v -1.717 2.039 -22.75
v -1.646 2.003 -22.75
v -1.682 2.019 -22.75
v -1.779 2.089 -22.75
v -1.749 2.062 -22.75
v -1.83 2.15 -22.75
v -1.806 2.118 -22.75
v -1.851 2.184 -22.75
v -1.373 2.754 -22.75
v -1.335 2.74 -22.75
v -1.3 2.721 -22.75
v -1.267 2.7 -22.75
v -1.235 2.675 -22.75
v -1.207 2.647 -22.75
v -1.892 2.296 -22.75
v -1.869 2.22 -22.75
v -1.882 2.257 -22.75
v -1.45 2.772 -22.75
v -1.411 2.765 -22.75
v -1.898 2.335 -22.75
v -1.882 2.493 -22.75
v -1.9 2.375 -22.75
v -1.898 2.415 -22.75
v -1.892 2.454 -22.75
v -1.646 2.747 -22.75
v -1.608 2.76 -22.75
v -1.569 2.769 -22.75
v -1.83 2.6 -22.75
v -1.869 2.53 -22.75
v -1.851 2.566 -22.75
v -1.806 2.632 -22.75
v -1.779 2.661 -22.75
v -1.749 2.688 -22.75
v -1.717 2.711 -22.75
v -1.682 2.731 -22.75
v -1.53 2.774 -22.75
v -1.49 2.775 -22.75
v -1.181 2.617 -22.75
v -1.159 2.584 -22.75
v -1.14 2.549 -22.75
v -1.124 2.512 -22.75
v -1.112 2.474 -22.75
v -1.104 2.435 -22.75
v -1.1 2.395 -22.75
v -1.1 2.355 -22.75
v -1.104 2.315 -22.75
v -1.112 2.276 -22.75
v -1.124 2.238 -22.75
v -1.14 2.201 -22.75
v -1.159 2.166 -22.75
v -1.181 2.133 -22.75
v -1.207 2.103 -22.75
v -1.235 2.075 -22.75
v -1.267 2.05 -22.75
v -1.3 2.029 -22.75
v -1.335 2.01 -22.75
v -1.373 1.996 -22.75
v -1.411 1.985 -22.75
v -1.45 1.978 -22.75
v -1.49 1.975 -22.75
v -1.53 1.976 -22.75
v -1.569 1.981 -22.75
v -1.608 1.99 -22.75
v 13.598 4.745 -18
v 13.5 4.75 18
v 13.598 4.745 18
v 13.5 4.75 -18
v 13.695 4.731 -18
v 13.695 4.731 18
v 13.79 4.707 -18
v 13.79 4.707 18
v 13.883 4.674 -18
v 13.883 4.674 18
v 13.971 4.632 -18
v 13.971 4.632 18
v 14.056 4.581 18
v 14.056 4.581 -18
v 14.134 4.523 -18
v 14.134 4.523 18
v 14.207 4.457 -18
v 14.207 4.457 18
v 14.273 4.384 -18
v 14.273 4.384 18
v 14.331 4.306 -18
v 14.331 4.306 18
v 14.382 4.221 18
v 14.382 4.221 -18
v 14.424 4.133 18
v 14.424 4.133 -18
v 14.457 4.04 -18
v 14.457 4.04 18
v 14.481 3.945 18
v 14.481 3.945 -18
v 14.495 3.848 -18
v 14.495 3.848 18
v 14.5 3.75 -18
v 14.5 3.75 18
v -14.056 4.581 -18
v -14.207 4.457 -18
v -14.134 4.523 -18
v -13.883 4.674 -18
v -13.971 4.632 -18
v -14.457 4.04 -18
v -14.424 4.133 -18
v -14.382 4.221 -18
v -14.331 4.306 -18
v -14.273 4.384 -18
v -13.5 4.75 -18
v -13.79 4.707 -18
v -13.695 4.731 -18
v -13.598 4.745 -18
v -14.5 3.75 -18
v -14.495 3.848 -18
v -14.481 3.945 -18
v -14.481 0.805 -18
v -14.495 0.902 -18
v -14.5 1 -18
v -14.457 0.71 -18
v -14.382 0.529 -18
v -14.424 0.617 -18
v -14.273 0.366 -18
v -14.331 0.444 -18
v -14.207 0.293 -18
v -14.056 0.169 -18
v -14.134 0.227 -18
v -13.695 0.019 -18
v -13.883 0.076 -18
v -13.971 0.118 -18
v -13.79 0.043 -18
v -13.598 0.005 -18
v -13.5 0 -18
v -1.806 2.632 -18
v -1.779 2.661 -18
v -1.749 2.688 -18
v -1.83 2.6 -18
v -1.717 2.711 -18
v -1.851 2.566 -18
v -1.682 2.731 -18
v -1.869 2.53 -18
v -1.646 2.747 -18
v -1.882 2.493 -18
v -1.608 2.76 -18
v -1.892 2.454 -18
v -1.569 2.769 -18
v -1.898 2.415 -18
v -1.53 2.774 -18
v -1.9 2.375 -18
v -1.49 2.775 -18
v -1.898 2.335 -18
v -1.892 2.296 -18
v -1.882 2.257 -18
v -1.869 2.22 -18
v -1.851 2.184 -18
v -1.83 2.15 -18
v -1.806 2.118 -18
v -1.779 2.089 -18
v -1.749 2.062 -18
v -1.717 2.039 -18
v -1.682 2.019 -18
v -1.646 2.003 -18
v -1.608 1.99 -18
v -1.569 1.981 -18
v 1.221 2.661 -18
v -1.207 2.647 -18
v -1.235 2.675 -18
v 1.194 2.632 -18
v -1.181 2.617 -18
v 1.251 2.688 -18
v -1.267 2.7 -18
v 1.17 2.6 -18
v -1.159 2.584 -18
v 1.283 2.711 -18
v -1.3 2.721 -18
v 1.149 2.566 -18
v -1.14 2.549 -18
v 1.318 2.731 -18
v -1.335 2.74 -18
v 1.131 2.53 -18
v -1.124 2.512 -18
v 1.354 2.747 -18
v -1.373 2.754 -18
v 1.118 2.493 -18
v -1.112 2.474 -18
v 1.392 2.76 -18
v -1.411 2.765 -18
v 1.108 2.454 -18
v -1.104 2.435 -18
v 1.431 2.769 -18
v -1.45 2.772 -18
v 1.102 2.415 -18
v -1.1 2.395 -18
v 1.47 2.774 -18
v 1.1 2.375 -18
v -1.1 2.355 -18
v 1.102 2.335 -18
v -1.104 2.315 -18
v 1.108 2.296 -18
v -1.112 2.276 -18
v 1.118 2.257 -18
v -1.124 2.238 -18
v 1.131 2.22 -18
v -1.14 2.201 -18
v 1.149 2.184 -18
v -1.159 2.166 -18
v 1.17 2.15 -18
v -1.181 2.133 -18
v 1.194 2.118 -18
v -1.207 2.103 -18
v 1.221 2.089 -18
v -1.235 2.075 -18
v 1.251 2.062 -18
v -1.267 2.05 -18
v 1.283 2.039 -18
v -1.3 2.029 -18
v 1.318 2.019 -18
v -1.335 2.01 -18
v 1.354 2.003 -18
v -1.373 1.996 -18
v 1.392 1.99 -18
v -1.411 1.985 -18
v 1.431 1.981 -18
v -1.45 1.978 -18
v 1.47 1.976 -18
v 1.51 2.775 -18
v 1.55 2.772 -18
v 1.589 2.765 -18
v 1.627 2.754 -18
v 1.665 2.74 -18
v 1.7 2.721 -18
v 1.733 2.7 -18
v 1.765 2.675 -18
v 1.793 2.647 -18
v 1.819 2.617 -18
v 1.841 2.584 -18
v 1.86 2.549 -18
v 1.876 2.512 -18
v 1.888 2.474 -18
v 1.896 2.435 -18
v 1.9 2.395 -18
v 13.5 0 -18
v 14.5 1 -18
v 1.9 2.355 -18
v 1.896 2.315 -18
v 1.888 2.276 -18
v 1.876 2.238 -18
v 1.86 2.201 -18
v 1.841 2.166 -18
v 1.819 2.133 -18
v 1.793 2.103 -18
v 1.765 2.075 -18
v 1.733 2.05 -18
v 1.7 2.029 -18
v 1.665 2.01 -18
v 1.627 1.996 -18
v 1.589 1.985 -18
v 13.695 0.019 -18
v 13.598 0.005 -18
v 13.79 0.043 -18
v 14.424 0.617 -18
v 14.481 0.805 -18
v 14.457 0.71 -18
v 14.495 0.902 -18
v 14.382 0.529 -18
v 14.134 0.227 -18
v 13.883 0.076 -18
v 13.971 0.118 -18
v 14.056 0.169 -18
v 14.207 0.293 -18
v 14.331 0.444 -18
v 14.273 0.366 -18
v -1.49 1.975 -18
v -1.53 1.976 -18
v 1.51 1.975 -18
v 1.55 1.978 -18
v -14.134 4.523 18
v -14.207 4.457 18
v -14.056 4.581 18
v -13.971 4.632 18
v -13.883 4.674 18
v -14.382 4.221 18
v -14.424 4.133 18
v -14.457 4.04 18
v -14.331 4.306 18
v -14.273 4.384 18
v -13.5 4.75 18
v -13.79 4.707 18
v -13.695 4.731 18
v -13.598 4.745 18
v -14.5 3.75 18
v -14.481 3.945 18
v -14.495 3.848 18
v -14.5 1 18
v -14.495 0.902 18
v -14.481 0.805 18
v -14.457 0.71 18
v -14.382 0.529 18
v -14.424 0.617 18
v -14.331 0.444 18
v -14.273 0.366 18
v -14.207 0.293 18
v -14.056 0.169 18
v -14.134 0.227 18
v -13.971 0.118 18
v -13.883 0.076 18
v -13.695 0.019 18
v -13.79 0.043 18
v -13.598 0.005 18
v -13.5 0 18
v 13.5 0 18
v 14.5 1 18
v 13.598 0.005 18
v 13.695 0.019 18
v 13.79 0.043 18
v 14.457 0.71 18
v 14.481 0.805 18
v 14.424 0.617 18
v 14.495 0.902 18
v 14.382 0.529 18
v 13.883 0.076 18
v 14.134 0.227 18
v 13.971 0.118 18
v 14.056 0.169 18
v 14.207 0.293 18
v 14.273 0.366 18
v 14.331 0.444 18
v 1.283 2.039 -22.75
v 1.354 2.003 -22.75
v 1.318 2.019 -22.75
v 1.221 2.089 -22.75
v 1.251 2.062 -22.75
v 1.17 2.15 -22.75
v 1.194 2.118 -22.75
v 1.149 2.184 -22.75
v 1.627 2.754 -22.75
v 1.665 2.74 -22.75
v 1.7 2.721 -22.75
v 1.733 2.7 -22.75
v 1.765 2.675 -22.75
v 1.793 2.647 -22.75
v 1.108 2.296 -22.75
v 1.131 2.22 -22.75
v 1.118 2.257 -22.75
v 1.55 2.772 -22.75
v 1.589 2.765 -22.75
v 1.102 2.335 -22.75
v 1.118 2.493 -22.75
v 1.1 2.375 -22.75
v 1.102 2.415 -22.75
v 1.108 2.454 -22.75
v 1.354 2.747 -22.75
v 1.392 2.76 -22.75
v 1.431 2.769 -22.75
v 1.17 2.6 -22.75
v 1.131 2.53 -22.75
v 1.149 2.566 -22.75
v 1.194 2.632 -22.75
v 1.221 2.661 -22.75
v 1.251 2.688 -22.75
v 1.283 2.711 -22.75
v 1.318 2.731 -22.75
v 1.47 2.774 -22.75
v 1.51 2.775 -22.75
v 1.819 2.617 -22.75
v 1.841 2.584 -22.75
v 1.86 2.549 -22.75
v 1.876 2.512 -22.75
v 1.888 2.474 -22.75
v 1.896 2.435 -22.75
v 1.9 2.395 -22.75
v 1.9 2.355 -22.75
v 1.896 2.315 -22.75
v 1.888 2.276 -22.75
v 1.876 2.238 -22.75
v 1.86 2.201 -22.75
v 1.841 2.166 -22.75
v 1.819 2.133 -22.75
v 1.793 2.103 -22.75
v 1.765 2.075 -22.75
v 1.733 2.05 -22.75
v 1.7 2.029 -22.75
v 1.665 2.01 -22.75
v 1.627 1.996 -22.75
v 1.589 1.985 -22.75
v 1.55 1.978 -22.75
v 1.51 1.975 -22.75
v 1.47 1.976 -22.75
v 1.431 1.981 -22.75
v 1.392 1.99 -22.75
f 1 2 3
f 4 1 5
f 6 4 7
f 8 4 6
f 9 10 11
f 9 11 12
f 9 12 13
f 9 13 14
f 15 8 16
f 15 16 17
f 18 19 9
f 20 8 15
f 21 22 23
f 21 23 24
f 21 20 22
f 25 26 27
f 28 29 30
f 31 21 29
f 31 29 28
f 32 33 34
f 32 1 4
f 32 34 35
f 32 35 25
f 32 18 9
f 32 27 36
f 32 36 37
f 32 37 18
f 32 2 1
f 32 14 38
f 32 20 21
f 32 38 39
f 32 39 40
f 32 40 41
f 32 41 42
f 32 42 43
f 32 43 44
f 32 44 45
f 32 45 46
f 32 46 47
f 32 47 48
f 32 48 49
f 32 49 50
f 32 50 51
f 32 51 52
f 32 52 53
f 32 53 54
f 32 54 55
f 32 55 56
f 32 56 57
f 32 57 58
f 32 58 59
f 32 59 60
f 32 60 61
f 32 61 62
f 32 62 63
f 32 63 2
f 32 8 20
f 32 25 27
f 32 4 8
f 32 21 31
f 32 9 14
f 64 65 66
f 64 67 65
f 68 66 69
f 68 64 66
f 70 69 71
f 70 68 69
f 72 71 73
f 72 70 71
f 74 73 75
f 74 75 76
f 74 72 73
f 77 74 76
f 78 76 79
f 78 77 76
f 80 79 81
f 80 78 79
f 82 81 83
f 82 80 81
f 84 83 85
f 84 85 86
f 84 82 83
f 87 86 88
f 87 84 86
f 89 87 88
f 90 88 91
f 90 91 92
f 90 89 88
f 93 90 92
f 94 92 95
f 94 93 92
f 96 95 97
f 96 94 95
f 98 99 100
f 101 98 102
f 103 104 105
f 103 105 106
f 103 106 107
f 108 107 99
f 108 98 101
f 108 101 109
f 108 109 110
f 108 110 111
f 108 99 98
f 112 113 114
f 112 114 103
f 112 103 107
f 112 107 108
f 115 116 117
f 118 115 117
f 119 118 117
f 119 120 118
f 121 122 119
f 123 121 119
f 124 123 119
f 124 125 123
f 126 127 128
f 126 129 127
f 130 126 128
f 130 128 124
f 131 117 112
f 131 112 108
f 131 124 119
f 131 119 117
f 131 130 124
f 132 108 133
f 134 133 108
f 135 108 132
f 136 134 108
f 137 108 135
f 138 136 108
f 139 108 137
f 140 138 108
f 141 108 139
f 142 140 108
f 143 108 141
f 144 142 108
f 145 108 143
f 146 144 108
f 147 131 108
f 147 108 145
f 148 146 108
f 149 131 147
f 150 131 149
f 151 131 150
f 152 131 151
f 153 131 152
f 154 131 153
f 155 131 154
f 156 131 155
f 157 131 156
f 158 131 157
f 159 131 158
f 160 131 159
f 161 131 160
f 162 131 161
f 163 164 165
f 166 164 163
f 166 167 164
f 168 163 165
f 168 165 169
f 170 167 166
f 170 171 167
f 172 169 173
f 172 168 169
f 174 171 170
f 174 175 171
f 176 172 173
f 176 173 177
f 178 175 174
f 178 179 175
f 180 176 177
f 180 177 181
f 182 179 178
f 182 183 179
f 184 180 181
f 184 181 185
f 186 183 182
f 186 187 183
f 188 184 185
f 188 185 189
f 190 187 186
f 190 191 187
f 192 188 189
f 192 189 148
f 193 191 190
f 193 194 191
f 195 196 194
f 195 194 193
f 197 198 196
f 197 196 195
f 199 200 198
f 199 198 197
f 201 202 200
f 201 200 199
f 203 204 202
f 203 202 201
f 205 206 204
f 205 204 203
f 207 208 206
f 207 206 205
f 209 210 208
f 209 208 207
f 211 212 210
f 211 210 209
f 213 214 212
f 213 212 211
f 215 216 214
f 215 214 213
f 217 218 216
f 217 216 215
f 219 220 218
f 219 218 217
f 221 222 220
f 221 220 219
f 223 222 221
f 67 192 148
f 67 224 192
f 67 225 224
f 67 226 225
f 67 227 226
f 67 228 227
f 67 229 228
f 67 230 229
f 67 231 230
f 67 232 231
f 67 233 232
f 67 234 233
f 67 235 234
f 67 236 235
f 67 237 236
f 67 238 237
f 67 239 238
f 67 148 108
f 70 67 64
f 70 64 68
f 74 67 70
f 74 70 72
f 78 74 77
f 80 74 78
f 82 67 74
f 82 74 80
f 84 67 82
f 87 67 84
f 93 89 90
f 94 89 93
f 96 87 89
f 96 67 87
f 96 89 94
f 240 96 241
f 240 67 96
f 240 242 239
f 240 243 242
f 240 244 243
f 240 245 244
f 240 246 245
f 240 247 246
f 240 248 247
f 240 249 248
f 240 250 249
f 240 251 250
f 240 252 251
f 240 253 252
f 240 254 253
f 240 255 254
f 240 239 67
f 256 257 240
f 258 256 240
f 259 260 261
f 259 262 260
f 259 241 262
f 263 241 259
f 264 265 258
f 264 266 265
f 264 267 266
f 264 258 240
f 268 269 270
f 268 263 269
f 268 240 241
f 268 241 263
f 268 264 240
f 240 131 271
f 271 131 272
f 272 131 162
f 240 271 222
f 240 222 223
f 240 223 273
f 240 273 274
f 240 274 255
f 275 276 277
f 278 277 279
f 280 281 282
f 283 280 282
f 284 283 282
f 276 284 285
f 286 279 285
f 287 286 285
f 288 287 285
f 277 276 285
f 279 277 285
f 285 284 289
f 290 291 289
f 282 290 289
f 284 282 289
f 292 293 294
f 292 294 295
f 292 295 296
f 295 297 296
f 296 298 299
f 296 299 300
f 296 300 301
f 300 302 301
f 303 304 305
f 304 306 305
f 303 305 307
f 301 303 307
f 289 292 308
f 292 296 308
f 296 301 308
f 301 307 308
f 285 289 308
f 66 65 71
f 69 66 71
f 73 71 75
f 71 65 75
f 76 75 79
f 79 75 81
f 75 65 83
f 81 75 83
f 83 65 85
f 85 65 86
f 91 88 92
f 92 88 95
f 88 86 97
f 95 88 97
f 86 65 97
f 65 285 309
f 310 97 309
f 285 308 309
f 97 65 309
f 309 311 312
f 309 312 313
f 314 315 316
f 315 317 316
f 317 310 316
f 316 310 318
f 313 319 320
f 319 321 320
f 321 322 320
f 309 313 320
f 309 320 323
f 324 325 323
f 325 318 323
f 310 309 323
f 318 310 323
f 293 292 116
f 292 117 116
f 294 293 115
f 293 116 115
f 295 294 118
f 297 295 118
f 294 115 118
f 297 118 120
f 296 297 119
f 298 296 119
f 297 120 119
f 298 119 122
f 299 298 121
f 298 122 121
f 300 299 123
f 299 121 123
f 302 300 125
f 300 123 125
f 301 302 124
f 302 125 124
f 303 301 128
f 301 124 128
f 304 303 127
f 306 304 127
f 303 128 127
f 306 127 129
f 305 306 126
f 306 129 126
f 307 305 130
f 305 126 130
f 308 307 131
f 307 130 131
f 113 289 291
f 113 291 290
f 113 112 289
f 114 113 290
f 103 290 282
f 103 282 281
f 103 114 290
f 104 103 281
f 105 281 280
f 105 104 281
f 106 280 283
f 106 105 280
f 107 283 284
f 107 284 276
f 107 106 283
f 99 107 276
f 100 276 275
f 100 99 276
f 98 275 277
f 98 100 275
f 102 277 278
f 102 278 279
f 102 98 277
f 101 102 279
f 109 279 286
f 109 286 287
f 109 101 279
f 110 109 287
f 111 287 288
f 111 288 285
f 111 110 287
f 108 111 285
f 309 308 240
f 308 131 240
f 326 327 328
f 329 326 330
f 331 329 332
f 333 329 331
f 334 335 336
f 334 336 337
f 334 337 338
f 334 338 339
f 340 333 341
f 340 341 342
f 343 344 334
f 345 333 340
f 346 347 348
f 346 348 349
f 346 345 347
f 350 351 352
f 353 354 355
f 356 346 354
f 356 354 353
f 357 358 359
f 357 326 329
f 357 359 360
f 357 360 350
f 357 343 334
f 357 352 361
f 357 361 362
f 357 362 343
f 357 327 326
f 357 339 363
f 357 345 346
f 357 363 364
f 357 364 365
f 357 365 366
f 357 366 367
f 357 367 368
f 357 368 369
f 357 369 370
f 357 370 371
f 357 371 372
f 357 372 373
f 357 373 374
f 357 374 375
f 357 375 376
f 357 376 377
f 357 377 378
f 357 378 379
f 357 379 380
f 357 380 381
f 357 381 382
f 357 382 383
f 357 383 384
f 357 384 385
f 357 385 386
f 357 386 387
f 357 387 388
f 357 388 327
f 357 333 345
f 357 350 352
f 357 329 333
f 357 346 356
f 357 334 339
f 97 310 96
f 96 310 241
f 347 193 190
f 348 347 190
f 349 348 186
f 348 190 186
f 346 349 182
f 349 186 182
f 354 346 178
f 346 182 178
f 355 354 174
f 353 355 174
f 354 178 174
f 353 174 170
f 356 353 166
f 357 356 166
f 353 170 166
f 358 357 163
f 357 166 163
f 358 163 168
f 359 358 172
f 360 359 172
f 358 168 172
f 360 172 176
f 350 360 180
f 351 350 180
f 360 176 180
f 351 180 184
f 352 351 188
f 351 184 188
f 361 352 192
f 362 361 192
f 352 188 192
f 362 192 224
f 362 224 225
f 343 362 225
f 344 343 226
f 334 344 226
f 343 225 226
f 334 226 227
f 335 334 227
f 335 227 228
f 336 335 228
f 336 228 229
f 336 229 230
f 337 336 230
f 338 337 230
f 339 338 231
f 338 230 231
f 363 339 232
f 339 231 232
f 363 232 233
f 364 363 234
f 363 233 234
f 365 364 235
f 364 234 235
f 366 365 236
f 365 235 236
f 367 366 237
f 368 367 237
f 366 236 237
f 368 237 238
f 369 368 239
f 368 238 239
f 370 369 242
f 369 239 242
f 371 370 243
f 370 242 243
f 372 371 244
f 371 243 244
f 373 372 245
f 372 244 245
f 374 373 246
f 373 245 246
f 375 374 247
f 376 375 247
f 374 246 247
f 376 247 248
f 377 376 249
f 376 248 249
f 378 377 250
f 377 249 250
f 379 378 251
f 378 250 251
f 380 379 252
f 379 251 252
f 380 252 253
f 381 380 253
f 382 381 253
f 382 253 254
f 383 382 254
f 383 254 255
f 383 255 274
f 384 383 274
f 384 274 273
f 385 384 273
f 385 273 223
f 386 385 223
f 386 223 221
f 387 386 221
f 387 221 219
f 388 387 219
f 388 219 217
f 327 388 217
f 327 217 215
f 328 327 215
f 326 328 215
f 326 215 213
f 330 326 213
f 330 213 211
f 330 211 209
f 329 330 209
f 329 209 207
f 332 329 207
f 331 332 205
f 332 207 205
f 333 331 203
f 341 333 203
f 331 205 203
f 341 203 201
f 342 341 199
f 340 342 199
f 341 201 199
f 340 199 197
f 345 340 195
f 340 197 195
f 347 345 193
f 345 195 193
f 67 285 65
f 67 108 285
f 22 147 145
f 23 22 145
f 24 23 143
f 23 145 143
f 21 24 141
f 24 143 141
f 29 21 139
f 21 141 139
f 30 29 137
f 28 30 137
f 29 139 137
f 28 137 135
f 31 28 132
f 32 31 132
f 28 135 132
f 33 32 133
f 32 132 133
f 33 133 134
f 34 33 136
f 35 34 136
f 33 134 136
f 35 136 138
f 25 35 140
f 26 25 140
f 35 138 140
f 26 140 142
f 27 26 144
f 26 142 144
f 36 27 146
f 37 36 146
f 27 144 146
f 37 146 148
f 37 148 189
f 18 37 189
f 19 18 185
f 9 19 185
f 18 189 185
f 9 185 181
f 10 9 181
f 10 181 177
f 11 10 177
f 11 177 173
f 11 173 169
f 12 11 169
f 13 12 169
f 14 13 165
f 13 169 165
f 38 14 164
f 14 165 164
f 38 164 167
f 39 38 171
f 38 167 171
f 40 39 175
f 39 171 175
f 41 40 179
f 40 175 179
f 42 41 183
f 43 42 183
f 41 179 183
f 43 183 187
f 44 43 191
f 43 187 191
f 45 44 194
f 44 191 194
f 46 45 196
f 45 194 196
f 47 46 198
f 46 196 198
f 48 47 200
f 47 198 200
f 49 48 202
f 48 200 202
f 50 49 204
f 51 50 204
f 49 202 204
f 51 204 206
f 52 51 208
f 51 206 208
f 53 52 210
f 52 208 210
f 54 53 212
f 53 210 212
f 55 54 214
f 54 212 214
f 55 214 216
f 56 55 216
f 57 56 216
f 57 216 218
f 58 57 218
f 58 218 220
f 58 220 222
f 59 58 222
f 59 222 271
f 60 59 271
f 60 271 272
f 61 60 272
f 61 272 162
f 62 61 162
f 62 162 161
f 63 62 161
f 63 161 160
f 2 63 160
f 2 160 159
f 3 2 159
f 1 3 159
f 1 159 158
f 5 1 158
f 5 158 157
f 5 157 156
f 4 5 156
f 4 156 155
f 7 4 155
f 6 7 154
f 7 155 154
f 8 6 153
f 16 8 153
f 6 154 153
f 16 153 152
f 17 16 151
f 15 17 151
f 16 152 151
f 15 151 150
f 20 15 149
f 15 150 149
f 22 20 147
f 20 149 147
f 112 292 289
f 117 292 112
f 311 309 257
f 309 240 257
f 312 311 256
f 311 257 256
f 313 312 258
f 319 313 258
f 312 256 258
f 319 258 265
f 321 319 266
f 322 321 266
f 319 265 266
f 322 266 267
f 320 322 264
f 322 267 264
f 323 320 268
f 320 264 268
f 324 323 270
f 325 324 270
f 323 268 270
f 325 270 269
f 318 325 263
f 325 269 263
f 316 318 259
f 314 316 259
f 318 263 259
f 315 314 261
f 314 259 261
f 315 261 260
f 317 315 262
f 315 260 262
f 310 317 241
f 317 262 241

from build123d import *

# Parameters (mm, degrees)
SKETCH1_W           = 29
SKETCH1_H           = 36
BOSS_EXTRUDE1_DEPTH = 4.75
SKETCH2_R           = 0.4
BOSS_EXTRUDE2_DEPTH = 4.75
FILLET1_R           = 1


with BuildPart() as part:
    # Sketch1 → Boss-Extrude1 (new body)
    with BuildSketch(Plane(origin=(0, 0, 0), x_dir=(1, 0, 0), z_dir=(0, 1, 0))):
        Rectangle(SKETCH1_W, SKETCH1_H)
    extrude(amount=BOSS_EXTRUDE1_DEPTH)

    # Sketch2 → Boss-Extrude2 (add)
    with BuildSketch(Plane(origin=(0, 0, -18), x_dir=(-1, 0, 0), z_dir=(0, 0, -1))):
        with Locations((1.5, 2.375)):
            Circle(SKETCH2_R)
        with Locations((-1.5, 2.375)):
            Circle(SKETCH2_R)
    extrude(amount=BOSS_EXTRUDE2_DEPTH)

    # Fillet1
    fillet1_edges = [part.edges().sort_by_distance(p)[0] for p in [
        (-14.5, 4.75, 0),
        (14.5, 4.75, 0),
        (-14.5, 0, 0),
        (14.5, 0, 0),
    ]]
    fillet(fillet1_edges, radius=FILLET1_R)


solid = part.part
